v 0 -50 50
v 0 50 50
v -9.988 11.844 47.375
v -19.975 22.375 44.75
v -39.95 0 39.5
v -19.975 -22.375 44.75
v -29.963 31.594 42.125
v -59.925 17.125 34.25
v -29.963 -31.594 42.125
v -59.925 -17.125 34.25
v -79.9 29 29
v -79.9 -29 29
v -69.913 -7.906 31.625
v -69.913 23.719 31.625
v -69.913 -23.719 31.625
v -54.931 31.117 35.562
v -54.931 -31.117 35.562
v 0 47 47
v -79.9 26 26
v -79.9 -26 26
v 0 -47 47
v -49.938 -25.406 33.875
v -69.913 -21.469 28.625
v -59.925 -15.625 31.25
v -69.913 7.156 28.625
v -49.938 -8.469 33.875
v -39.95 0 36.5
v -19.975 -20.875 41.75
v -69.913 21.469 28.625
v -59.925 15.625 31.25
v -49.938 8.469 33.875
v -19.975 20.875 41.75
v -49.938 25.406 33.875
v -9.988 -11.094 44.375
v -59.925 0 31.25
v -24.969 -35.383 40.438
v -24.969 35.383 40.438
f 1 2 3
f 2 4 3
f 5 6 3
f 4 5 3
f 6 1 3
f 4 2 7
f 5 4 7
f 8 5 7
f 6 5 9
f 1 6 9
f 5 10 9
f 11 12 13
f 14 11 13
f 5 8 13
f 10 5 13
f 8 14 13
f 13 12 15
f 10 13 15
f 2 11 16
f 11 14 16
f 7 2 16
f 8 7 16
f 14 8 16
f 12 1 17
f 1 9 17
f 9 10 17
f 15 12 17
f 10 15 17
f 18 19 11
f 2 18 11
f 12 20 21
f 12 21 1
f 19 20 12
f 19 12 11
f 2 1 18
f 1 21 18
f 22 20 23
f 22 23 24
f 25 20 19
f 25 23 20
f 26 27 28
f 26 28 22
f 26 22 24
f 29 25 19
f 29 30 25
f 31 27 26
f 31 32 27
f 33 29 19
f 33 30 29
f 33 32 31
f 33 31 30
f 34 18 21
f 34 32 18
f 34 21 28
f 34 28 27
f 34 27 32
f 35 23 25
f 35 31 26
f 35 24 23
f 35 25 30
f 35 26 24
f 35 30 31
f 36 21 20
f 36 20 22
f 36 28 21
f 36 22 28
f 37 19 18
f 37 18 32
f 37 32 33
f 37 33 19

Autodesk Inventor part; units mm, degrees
ref_plane "XZ Plane" through (0, 0, 0) normal (0, 1, 0) x (-1, 0, 0)
ref_plane "XY Plane" through (0, 0, 0) normal (0, 0, 1) x (1, 0, 0)
sketch "Sketch1" plane through (0, 0, 0) normal (1, 0, 0) x (0, 1, 0)
  line L0 (-50, -50) -> (50, -50)
  line L1 (50, -50) -> (50, 50)
  line L2 (50, 50) -> (-50, 50)
  line L3 (-50, 50) -> (-50, -50)
  line L4 (-50, -50) -> (50, 50) construction
  line L5 (50, -50) -> (-50, 50) construction
  line L6 (-47, -47) -> (47, -47)
  line L7 (47, -47) -> (47, 47)
  line L8 (47, 47) -> (-47, 47)
  line L9 (-47, 47) -> (-47, -47)
  line L10 (-47, -47) -> (47, 47) construction
  line L11 (47, -47) -> (-47, 47) construction
  point P0 (0, 0)
  dimension "d0" = 100
  dimension "d1" = 100
  dimension "d7" = 3
  dimension "d8" = 3
ref_plane "Work Plane1" through (-79.9, 0, 0) normal (1, 0, 0) x (0, 1, 0)
sketch "Sketch2" plane through (-79.9, 0, 0) normal (1, 0, 0) x (0, 1, 0)
  line L0 (-26, -26) -> (26, -26)
  line L1 (26, -26) -> (26, 26)
  line L2 (26, 26) -> (-26, 26)
  line L3 (-26, 26) -> (-26, -26)
  line L4 (-26, -26) -> (26, 26) construction
  line L5 (26, -26) -> (-26, 26) construction
  line L6 (-29, -29) -> (29, -29)
  line L7 (29, -29) -> (29, 29)
  line L8 (29, 29) -> (-29, 29)
  line L9 (-29, 29) -> (-29, -29)
  line L10 (-29, -29) -> (29, 29) construction
  line L11 (29, -29) -> (-29, 29) construction
  point P0 (0, 0)
  dimension "d4" = 52
  dimension "d5" = 52
  dimension "d9" = 3
loft "Loft1" add profiles "Sketch1", "Sketch2" contours L3 L2 L1 L0 | L9 L8 L7 L6 / L3 L2 L1 L0 | L9 L8 L7 L6
sketch "Sketch3" plane through (0, -50, -50) normal (1, 0, 0) x (0, 0, -1)
  line L0 (-3, 3) -> (-97, 3)
  line L1 (-97, 3) -> (-97, 97)
  line L2 (-97, 97) -> (-3, 97)
  line L3 (-3, 97) -> (-3, 3)
  line L4 (-3, 3) -> (-97, 97) construction
  line L5 (-97, 3) -> (-3, 97) construction
  line L6 (0, 100) -> (-100, 100) projected
  line L7 (-100, 100) -> (-100, 0) projected
  point P0 (-50, 50)
  dimension "d14" = 3
  dimension "d15" = 3
sketch "Sketch4" plane through (-79.9, -29, -29) normal (-1, 0, 0) x (0, 0, 1)
  line L0 (3, 55) -> (55, 55)
  line L1 (55, 55) -> (55, 3)
  line L2 (55, 3) -> (3, 3)
  line L3 (3, 3) -> (3, 55)
  line L4 (3, 55) -> (55, 3) construction
  line L5 (55, 55) -> (3, 3) construction
  line L6 (58, 58) -> (58, 0) projected
  line L7 (58, 0) -> (0, 0) projected
  point P0 (29, 29)
  dimension "d16" = 3
  dimension "d17" = 3
loft "Loft2" cut profiles "Sketch4", "Sketch3"
sketch "Sketch5" plane through (0, 0, 0) normal (1, 0, 0) x (0, 1, 0)
  line L0 (50, 50) -> (-50, 50) projected
  line L1 (-50, 50) -> (-50, -50) projected
  line L2 (-50, -50) -> (50, -50) projected
  line L3 (50, -50) -> (50, 50) projected
  line L4 (0, 0) -> (-50, 50)
  line L5 (0, 0) -> (50, 50)
  line L6 (26, 26) -> (47, 47) projected
extrude "Extrusion1" cut sketch "Sketch5" against normal through all contours L3 L2 L1 L4 L5
equation "\"d0\" = width"
equation "\"d1\" = height"
equation "\"d7\" = mirrorThickness"
equation "\"d8\" = mirrorThickness"
equation "\"d4\" = detectorWidth"
equation "\"d5\" = detectorHeight"
equation "\"d9\" = mirrorThickness"
equation "\"d14\" = mirrorThickness"
equation "\"d15\" = mirrorThickness"
equation "\"d16\" = mirrorThickness"
equation "\"d17\" = mirrorThickness"
equation "\"acrylicThickness\" = 6.35"
equation "\"height\" = 100"
equation "\"width\" = 100"
equation "\"mirrorAngle\" = 12deg"
equation "\"detectorWidth\" = 52"
equation "\"detectorHeight\" = 52"
equation "\"mirrorThickness\" = 3"
equation "\"d3\" = fresnelThickness - depth + aerogelThickness"
equation "\"fresnelThickness\" = 0.1"
equation "\"focalLength\" = 76.2"
equation "\"ior\" = 1.49"
equation "\"fresnelAngle\" = 90deg"
equation "\"centerThickness\" = 1.524"
equation "\"fresnelEffectiveDiameter\" = 76.2"
equation "\"depth\" = 100"
equation "\"aerogelThickness\" = 20"
properties part number "mirror" material "Glass"
